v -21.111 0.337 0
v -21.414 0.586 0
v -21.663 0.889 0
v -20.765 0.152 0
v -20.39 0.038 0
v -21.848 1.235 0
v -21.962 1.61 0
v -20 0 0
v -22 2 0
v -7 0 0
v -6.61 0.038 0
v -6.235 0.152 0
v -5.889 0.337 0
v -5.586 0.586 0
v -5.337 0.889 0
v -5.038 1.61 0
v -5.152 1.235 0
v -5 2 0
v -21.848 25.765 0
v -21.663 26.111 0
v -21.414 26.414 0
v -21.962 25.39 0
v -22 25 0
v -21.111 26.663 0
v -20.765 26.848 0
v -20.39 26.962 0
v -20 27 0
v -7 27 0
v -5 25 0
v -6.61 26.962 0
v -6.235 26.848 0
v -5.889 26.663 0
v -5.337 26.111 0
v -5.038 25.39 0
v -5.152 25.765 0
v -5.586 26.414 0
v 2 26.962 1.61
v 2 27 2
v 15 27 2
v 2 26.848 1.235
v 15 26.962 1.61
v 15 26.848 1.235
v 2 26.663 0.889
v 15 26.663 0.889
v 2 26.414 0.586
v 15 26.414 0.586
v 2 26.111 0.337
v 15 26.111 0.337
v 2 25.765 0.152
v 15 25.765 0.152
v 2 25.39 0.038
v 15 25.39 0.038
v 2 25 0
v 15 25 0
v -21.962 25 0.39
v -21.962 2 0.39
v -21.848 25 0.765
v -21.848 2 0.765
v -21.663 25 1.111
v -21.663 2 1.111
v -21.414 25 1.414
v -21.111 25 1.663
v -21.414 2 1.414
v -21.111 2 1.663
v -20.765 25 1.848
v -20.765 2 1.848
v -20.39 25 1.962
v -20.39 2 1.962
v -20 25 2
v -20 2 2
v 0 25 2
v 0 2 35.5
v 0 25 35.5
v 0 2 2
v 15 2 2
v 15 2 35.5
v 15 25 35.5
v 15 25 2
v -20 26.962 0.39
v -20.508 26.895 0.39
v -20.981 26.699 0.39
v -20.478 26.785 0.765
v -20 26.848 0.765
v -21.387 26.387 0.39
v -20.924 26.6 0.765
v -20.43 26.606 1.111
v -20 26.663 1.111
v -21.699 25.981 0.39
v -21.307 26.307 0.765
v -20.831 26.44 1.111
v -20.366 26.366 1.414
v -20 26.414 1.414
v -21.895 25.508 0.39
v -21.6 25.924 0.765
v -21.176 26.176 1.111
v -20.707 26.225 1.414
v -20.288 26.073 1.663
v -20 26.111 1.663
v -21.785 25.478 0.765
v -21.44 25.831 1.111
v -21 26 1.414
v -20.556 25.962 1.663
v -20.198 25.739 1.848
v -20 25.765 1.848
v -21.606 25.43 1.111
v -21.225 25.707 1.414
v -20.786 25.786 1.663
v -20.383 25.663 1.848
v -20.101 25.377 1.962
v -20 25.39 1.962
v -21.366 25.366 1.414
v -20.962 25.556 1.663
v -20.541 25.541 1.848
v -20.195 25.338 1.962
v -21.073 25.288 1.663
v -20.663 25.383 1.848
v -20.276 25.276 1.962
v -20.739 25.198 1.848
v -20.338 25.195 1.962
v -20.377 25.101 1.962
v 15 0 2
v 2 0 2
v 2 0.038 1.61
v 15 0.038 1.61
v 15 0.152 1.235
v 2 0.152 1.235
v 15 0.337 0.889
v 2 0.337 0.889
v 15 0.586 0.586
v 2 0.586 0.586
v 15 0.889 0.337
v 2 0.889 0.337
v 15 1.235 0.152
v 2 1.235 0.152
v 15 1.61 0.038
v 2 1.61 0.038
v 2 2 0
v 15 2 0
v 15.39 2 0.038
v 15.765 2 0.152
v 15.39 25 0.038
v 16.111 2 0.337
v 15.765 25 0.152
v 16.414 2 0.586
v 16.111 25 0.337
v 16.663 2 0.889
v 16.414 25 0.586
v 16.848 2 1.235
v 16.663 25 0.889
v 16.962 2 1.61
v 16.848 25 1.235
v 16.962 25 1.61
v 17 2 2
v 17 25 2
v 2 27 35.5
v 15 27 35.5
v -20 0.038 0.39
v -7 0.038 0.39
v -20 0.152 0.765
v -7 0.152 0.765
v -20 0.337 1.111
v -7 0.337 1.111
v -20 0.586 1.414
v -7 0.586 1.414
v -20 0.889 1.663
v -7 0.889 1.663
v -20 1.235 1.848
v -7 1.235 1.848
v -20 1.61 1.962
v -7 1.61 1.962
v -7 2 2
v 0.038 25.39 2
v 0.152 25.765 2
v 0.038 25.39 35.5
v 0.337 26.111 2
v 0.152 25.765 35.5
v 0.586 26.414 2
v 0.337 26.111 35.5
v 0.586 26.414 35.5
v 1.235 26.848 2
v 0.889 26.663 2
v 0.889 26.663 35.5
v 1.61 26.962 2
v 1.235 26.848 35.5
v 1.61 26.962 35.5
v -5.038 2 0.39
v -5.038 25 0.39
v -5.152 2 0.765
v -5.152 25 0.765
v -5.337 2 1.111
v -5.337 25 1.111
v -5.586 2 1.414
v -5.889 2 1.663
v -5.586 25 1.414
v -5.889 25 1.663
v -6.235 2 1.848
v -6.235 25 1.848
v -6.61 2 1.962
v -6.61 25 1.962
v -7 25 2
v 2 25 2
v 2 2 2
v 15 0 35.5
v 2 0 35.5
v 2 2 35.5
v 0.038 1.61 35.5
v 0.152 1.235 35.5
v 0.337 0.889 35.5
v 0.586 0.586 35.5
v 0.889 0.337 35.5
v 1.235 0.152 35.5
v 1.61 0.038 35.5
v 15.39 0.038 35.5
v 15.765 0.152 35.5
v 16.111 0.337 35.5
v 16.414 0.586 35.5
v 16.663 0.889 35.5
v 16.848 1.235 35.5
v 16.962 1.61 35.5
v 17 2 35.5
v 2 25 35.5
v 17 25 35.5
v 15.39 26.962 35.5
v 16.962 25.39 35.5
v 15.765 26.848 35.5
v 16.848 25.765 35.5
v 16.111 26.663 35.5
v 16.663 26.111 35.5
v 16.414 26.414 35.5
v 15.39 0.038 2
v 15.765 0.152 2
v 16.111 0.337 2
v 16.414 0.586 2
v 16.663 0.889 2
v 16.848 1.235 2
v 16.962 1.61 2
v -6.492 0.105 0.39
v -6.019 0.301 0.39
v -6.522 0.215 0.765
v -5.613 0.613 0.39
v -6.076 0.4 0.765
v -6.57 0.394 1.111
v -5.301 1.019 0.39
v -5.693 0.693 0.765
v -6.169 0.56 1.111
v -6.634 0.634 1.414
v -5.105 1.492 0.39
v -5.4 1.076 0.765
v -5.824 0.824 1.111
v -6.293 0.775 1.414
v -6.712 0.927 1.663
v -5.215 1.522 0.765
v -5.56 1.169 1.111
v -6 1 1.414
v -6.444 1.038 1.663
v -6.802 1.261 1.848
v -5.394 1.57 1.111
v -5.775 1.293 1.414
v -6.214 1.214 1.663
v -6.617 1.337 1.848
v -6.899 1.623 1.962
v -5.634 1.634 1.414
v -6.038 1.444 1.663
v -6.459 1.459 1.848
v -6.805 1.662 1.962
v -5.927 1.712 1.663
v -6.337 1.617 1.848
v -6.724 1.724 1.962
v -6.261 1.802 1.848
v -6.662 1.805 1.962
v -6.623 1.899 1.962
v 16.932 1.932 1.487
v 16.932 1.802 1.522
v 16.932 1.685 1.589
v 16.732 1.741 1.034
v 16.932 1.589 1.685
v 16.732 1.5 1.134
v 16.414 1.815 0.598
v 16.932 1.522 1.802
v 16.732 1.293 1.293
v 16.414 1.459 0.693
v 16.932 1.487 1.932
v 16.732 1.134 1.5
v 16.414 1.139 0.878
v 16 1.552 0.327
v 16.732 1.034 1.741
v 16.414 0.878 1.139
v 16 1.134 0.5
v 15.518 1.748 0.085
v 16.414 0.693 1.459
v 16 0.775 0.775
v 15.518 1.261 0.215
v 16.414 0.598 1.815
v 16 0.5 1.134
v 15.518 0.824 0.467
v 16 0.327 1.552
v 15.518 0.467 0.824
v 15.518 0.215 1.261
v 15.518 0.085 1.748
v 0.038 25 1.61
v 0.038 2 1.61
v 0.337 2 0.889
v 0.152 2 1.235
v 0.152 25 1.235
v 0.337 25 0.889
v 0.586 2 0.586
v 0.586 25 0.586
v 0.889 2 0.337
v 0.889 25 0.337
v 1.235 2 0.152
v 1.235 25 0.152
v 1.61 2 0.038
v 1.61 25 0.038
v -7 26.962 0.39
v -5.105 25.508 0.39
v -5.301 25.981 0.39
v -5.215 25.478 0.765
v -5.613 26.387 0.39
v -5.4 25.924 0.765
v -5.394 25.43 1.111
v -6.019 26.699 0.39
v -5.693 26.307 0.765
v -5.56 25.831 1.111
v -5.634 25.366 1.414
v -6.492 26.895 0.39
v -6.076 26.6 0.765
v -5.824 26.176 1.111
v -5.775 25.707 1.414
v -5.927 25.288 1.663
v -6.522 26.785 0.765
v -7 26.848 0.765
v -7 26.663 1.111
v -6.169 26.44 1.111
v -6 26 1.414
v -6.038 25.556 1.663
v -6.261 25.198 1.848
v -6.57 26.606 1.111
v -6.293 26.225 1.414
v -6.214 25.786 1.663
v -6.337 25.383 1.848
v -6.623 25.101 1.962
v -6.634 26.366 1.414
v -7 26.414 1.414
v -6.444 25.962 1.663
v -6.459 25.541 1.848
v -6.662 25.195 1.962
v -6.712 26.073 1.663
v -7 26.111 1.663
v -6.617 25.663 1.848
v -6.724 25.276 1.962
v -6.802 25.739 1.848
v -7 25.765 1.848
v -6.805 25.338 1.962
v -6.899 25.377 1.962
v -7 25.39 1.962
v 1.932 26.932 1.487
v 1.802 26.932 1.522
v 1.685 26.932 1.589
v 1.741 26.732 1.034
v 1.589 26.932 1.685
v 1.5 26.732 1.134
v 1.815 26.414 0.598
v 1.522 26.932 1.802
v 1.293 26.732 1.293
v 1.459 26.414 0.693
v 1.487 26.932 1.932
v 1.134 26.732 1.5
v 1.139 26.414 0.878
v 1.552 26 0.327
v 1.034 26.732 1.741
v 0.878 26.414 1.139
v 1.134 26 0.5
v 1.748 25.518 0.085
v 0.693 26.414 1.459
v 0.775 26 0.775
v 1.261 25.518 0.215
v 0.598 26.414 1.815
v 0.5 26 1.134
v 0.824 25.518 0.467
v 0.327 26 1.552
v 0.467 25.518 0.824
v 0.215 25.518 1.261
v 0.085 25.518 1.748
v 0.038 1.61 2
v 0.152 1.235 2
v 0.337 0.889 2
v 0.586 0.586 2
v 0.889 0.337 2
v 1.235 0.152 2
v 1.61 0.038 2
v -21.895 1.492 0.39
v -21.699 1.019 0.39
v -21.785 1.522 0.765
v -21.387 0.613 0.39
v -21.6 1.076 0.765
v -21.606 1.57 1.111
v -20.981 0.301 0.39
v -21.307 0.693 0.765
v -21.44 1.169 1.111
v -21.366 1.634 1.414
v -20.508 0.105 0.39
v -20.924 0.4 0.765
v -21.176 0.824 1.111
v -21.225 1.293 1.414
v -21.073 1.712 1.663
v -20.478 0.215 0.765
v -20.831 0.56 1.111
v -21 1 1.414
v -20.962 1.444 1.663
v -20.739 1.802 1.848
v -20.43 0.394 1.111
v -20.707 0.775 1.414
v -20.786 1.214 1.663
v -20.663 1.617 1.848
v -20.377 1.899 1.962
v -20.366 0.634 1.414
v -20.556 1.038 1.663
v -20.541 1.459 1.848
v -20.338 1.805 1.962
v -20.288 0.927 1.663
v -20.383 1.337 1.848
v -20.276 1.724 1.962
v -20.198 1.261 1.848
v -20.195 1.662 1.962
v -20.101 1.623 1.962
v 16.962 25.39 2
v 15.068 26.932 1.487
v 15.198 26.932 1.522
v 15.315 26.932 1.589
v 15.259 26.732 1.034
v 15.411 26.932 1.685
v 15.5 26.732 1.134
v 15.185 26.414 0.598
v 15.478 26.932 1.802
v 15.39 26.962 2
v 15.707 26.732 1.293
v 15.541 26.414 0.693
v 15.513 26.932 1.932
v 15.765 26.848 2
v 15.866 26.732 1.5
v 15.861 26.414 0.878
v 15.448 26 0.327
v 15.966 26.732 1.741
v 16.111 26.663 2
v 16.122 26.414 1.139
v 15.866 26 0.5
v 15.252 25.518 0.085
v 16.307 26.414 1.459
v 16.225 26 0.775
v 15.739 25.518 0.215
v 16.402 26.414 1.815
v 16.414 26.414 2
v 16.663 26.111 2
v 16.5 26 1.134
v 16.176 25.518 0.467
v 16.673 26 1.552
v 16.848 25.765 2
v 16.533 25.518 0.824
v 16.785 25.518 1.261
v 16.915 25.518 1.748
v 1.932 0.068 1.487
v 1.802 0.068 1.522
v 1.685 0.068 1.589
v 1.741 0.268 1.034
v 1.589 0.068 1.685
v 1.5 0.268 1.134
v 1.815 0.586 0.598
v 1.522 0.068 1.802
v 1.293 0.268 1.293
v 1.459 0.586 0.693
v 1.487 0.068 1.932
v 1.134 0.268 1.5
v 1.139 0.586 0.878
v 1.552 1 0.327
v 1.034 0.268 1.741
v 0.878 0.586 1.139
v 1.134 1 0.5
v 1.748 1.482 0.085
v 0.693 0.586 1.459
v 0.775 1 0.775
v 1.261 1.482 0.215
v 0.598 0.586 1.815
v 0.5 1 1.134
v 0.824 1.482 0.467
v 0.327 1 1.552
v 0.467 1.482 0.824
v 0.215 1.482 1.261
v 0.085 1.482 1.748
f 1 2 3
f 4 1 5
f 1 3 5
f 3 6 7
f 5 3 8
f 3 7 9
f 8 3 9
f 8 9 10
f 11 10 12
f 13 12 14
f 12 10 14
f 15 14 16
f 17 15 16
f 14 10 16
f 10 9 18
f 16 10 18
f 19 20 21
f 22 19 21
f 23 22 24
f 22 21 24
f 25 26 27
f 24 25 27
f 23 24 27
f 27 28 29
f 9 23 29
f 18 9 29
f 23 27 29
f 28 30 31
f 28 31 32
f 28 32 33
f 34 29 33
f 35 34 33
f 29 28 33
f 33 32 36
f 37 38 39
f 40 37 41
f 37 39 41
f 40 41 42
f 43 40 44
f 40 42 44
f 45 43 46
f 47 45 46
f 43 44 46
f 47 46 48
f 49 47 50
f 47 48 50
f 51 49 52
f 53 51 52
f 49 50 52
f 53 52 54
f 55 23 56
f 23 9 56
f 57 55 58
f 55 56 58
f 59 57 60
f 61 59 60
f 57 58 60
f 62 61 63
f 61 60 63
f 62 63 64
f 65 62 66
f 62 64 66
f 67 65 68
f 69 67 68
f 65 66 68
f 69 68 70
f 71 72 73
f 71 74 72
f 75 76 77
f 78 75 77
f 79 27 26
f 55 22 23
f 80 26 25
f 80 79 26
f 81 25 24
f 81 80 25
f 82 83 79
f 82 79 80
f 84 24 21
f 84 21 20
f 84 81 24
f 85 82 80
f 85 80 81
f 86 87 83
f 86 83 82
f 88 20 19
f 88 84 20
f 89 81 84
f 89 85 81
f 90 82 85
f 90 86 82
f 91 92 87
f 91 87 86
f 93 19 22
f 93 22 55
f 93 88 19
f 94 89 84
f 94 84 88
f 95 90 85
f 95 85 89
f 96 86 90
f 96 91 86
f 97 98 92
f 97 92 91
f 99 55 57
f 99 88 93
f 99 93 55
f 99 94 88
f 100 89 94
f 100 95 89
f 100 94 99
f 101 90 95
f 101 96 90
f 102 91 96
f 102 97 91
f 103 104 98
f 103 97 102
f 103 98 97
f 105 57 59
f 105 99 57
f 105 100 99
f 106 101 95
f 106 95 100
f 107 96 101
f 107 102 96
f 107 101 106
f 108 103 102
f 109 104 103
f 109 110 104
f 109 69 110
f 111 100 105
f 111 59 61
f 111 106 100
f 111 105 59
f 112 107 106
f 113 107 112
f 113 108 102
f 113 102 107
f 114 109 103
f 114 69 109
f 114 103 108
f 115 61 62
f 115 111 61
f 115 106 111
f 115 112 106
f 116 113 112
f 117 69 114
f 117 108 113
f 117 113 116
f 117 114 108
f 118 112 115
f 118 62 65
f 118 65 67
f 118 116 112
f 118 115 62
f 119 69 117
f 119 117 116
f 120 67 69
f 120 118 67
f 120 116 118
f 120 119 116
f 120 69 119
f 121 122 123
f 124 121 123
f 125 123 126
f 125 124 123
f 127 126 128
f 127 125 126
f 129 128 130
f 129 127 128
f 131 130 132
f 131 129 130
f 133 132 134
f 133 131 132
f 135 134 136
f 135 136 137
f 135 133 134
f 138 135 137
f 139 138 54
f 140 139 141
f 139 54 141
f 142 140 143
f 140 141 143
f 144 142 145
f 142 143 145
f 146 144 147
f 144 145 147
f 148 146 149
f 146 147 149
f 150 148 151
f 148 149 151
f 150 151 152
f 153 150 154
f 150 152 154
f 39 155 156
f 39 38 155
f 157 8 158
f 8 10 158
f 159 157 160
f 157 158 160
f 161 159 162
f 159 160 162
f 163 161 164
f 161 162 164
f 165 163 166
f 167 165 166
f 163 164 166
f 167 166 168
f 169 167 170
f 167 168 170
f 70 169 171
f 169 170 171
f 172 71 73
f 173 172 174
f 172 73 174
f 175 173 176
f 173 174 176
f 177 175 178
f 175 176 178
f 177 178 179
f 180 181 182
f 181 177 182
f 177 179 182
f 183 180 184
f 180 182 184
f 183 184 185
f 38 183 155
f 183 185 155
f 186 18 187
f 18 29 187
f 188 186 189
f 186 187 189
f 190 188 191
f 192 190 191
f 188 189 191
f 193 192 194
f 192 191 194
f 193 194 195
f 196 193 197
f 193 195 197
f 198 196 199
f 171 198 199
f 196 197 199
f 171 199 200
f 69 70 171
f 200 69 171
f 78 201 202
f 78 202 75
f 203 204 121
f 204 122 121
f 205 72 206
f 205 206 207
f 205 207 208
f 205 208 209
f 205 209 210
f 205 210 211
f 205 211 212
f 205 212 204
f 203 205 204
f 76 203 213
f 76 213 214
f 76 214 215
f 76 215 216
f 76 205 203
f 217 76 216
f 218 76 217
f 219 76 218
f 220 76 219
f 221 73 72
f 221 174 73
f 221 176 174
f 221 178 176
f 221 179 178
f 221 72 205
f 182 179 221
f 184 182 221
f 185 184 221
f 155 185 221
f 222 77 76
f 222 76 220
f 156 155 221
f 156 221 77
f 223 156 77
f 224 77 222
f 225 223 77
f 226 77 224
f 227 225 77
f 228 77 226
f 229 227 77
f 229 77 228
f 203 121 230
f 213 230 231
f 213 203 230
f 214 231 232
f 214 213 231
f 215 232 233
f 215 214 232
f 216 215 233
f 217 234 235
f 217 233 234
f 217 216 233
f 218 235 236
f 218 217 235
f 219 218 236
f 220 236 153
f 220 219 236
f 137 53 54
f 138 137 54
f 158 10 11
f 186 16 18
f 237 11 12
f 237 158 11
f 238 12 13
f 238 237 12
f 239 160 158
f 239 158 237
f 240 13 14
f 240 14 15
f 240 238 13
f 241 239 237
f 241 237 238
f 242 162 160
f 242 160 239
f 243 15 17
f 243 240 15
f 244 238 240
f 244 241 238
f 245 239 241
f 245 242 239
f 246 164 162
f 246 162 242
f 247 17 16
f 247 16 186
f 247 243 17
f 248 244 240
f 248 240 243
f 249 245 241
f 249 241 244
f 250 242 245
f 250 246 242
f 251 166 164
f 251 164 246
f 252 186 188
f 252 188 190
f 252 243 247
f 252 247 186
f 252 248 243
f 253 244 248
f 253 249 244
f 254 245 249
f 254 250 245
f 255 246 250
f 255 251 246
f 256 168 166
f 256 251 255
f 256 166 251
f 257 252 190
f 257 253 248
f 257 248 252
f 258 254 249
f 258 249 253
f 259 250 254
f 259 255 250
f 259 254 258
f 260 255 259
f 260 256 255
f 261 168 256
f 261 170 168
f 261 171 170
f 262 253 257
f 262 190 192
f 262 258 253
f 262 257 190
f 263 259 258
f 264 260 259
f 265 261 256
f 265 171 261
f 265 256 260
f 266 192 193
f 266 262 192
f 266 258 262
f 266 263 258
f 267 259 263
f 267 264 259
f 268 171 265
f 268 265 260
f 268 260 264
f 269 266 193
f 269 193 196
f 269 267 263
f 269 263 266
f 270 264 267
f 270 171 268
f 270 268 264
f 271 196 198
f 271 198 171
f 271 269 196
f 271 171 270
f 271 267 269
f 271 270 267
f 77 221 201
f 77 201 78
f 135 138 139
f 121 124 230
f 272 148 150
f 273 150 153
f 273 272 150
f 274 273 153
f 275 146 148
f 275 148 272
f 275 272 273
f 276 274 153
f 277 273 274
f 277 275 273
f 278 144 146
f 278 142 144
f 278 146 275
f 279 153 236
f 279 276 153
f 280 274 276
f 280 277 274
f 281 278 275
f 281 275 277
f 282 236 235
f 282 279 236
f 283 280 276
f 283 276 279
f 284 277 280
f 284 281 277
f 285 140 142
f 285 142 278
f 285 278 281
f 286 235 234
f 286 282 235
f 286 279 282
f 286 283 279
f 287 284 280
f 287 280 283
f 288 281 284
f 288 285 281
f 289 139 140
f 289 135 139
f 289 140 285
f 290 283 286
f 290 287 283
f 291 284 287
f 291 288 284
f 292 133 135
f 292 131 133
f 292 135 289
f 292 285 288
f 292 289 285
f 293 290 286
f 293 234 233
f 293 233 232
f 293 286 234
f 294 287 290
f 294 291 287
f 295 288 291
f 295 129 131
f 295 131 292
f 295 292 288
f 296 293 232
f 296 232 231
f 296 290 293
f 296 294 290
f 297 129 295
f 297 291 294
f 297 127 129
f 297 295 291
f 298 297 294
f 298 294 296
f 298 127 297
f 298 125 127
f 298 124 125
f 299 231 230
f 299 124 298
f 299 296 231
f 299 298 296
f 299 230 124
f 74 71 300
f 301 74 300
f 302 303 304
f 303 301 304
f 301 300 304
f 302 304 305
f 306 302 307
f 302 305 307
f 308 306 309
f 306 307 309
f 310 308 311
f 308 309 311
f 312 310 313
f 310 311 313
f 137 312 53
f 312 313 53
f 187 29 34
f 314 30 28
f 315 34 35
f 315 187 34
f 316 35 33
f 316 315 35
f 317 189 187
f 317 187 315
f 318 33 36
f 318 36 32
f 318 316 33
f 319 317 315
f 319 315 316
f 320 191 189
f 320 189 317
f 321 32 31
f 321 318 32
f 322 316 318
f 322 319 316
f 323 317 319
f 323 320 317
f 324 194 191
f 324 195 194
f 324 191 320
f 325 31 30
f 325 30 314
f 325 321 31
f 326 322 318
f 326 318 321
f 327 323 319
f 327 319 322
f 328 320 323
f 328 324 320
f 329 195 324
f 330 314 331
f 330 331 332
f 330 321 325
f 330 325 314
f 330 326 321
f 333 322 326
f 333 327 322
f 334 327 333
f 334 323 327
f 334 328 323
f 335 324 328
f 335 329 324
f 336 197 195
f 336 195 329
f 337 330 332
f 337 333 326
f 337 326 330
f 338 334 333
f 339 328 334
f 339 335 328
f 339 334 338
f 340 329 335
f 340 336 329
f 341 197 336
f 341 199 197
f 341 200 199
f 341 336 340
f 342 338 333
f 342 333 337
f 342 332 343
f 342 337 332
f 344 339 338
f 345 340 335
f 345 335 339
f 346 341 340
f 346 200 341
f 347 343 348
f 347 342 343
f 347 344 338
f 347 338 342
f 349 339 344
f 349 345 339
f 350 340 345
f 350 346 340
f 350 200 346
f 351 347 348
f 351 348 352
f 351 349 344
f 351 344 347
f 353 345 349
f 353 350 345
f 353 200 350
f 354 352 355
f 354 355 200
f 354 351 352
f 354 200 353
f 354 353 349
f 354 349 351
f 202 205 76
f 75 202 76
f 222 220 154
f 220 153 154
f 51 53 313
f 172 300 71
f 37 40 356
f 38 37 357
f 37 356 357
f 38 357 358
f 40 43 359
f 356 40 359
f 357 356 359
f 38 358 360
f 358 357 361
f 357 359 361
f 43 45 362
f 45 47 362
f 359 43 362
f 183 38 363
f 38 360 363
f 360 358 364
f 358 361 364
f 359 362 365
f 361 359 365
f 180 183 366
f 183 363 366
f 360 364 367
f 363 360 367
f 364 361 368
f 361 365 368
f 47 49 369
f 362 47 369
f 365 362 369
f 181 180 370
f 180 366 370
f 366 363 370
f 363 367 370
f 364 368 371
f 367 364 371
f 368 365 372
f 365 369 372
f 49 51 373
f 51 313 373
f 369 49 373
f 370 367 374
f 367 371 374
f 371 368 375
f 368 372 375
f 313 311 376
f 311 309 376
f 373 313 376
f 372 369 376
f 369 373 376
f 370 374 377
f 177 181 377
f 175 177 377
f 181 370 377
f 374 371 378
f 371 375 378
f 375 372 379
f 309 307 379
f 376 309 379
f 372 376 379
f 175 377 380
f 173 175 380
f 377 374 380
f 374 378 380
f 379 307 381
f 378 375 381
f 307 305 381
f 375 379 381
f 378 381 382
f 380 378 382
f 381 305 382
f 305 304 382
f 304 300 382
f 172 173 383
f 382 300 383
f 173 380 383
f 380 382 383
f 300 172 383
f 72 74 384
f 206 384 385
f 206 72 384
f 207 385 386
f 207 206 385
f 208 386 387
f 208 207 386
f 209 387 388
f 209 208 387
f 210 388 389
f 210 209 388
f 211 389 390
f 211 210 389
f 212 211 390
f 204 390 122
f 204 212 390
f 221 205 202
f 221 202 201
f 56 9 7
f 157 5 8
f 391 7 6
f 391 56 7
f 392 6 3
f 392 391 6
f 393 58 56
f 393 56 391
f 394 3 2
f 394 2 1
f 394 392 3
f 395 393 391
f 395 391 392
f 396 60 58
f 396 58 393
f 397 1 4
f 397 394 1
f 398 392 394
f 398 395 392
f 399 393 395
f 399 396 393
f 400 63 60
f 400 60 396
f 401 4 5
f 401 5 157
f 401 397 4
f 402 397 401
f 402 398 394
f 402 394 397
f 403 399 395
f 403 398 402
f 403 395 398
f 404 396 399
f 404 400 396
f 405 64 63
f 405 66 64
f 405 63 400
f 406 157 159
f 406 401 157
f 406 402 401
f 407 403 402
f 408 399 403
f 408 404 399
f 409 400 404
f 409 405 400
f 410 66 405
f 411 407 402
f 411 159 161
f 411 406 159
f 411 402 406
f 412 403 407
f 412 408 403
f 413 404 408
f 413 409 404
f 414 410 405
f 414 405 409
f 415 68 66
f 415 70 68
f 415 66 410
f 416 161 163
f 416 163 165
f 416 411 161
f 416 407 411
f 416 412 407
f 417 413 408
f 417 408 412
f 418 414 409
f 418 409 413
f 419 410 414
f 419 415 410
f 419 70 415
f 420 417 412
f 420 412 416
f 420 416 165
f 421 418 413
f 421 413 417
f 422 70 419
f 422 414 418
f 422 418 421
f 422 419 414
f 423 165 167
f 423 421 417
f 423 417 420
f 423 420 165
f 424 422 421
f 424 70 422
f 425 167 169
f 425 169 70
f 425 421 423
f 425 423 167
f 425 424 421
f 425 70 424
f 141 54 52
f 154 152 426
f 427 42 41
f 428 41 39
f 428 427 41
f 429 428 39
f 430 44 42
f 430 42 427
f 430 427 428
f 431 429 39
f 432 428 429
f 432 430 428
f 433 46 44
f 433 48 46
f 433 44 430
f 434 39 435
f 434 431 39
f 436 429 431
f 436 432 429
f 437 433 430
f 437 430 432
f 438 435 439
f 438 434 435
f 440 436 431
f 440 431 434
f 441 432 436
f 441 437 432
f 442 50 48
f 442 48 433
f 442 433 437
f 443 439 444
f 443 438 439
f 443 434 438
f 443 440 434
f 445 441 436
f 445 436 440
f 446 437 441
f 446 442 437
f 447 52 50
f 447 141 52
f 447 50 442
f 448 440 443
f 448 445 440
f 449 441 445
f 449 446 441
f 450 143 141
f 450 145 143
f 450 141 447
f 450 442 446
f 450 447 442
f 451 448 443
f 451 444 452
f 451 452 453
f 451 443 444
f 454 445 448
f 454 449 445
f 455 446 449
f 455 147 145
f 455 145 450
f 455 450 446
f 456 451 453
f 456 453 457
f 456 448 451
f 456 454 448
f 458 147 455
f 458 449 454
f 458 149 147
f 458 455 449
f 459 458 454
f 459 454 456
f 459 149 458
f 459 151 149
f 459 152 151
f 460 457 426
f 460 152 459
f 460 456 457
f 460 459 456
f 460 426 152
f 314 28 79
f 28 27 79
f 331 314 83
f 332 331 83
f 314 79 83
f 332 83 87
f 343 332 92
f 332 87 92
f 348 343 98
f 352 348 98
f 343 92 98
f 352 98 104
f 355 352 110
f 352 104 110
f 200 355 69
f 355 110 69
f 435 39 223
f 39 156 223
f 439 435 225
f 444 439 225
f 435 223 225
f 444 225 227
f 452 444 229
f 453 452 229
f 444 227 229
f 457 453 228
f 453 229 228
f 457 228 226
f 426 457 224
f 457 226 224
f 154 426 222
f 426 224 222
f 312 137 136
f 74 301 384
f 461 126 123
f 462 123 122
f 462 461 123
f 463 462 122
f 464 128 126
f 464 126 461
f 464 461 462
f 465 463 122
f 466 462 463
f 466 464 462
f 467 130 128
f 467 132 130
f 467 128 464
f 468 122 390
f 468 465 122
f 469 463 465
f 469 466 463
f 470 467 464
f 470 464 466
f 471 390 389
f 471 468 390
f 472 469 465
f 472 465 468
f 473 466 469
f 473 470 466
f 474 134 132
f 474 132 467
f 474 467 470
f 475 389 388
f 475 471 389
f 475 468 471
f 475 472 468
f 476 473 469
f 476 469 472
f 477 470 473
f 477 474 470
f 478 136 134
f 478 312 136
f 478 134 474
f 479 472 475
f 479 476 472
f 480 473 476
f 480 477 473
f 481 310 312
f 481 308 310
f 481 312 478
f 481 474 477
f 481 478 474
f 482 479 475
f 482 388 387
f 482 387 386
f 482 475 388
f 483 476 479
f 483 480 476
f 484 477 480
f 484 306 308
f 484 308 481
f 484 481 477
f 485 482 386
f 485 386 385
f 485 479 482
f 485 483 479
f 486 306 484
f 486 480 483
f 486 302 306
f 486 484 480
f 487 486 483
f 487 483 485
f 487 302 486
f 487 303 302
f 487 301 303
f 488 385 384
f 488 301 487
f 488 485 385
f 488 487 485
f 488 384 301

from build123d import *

# Parameters (mm, degrees)
F0_W     = 17
F0_H     = 27
F1_DEPTH = 35.5
F2_W     = 13
F2_H     = 23
F3_DEPTH = 33.5
F4_R     = 2
F6_DEPTH = 2
F7_R     = 1.99999


# Not quite as in the source:
# - a fillet or chamfer is up to 0.001 mm smaller than in the source, because OpenCascade refuses the exact size


with BuildPart() as f1:
    # F0 (on Top) → F1 (new body)
    with BuildSketch(Plane.XY):
        with Locations((8.5, 13.5)):
            Rectangle(F0_W, F0_H)
    extrude(amount=F1_DEPTH)

    # F2 (on face) → F3 (cut)
    with BuildSketch(Plane.XY.offset(35.5)):
        with Locations((8.5, 13.5)):
            Rectangle(F2_W, F2_H)
    extrude(amount=-F3_DEPTH, mode=Mode.SUBTRACT)

    # F4
    f4_edges = [f1.edges().sort_by_distance(p)[0] for p in [
        (0, 13.5, 0),
        (8.5, 0, 0),
        (17, 13.5, 0),
        (8.5, 27, 0),
        (17, 0, 17.75),
        (0, 0, 17.75),
        (17, 27, 17.75),
        (0, 27, 17.75),
    ]]
    fillet(f4_edges, radius=F4_R)


with BuildPart() as f6:
    # F5 (on Top) → F6 (new body)
    with BuildSketch(Plane.XY):
        with BuildLine():
            Line((-20, 0), (-7, 0))
            ThreePointArc((-7, 0), (-5.5857864376, 0.5857864376), (-5, 2))
            Line((-5, 2), (-5, 25))
            ThreePointArc((-5, 25), (-5.5857864376, 26.4142135624), (-7, 27))
            Line((-7, 27), (-20, 27))
            ThreePointArc((-20, 27), (-21.4142135624, 26.4142135624), (-22, 25))
            Line((-22, 25), (-22, 2))
            ThreePointArc((-22, 2), (-21.4142135624, 0.5857864376), (-20, 0))
        make_face()
    extrude(amount=F6_DEPTH)

    # F7 (radius 2 in the source; OpenCascade refuses exactly that, so slightly less here)
    f7_edges = [f6.edges().sort_by_distance(p)[0] for p in [
        (-13.5, 0, 2),
        (-5.585786, 0.585786, 2),
        (-5, 13.5, 2),
        (-5.585786, 26.414214, 2),
        (-13.5, 27, 2),
        (-21.414214, 26.414214, 2),
        (-22, 13.5, 2),
        (-21.414214, 0.585786, 2),
    ]]
    fillet(f7_edges, radius=F7_R)


solid = Compound([f1.part, f6.part])
